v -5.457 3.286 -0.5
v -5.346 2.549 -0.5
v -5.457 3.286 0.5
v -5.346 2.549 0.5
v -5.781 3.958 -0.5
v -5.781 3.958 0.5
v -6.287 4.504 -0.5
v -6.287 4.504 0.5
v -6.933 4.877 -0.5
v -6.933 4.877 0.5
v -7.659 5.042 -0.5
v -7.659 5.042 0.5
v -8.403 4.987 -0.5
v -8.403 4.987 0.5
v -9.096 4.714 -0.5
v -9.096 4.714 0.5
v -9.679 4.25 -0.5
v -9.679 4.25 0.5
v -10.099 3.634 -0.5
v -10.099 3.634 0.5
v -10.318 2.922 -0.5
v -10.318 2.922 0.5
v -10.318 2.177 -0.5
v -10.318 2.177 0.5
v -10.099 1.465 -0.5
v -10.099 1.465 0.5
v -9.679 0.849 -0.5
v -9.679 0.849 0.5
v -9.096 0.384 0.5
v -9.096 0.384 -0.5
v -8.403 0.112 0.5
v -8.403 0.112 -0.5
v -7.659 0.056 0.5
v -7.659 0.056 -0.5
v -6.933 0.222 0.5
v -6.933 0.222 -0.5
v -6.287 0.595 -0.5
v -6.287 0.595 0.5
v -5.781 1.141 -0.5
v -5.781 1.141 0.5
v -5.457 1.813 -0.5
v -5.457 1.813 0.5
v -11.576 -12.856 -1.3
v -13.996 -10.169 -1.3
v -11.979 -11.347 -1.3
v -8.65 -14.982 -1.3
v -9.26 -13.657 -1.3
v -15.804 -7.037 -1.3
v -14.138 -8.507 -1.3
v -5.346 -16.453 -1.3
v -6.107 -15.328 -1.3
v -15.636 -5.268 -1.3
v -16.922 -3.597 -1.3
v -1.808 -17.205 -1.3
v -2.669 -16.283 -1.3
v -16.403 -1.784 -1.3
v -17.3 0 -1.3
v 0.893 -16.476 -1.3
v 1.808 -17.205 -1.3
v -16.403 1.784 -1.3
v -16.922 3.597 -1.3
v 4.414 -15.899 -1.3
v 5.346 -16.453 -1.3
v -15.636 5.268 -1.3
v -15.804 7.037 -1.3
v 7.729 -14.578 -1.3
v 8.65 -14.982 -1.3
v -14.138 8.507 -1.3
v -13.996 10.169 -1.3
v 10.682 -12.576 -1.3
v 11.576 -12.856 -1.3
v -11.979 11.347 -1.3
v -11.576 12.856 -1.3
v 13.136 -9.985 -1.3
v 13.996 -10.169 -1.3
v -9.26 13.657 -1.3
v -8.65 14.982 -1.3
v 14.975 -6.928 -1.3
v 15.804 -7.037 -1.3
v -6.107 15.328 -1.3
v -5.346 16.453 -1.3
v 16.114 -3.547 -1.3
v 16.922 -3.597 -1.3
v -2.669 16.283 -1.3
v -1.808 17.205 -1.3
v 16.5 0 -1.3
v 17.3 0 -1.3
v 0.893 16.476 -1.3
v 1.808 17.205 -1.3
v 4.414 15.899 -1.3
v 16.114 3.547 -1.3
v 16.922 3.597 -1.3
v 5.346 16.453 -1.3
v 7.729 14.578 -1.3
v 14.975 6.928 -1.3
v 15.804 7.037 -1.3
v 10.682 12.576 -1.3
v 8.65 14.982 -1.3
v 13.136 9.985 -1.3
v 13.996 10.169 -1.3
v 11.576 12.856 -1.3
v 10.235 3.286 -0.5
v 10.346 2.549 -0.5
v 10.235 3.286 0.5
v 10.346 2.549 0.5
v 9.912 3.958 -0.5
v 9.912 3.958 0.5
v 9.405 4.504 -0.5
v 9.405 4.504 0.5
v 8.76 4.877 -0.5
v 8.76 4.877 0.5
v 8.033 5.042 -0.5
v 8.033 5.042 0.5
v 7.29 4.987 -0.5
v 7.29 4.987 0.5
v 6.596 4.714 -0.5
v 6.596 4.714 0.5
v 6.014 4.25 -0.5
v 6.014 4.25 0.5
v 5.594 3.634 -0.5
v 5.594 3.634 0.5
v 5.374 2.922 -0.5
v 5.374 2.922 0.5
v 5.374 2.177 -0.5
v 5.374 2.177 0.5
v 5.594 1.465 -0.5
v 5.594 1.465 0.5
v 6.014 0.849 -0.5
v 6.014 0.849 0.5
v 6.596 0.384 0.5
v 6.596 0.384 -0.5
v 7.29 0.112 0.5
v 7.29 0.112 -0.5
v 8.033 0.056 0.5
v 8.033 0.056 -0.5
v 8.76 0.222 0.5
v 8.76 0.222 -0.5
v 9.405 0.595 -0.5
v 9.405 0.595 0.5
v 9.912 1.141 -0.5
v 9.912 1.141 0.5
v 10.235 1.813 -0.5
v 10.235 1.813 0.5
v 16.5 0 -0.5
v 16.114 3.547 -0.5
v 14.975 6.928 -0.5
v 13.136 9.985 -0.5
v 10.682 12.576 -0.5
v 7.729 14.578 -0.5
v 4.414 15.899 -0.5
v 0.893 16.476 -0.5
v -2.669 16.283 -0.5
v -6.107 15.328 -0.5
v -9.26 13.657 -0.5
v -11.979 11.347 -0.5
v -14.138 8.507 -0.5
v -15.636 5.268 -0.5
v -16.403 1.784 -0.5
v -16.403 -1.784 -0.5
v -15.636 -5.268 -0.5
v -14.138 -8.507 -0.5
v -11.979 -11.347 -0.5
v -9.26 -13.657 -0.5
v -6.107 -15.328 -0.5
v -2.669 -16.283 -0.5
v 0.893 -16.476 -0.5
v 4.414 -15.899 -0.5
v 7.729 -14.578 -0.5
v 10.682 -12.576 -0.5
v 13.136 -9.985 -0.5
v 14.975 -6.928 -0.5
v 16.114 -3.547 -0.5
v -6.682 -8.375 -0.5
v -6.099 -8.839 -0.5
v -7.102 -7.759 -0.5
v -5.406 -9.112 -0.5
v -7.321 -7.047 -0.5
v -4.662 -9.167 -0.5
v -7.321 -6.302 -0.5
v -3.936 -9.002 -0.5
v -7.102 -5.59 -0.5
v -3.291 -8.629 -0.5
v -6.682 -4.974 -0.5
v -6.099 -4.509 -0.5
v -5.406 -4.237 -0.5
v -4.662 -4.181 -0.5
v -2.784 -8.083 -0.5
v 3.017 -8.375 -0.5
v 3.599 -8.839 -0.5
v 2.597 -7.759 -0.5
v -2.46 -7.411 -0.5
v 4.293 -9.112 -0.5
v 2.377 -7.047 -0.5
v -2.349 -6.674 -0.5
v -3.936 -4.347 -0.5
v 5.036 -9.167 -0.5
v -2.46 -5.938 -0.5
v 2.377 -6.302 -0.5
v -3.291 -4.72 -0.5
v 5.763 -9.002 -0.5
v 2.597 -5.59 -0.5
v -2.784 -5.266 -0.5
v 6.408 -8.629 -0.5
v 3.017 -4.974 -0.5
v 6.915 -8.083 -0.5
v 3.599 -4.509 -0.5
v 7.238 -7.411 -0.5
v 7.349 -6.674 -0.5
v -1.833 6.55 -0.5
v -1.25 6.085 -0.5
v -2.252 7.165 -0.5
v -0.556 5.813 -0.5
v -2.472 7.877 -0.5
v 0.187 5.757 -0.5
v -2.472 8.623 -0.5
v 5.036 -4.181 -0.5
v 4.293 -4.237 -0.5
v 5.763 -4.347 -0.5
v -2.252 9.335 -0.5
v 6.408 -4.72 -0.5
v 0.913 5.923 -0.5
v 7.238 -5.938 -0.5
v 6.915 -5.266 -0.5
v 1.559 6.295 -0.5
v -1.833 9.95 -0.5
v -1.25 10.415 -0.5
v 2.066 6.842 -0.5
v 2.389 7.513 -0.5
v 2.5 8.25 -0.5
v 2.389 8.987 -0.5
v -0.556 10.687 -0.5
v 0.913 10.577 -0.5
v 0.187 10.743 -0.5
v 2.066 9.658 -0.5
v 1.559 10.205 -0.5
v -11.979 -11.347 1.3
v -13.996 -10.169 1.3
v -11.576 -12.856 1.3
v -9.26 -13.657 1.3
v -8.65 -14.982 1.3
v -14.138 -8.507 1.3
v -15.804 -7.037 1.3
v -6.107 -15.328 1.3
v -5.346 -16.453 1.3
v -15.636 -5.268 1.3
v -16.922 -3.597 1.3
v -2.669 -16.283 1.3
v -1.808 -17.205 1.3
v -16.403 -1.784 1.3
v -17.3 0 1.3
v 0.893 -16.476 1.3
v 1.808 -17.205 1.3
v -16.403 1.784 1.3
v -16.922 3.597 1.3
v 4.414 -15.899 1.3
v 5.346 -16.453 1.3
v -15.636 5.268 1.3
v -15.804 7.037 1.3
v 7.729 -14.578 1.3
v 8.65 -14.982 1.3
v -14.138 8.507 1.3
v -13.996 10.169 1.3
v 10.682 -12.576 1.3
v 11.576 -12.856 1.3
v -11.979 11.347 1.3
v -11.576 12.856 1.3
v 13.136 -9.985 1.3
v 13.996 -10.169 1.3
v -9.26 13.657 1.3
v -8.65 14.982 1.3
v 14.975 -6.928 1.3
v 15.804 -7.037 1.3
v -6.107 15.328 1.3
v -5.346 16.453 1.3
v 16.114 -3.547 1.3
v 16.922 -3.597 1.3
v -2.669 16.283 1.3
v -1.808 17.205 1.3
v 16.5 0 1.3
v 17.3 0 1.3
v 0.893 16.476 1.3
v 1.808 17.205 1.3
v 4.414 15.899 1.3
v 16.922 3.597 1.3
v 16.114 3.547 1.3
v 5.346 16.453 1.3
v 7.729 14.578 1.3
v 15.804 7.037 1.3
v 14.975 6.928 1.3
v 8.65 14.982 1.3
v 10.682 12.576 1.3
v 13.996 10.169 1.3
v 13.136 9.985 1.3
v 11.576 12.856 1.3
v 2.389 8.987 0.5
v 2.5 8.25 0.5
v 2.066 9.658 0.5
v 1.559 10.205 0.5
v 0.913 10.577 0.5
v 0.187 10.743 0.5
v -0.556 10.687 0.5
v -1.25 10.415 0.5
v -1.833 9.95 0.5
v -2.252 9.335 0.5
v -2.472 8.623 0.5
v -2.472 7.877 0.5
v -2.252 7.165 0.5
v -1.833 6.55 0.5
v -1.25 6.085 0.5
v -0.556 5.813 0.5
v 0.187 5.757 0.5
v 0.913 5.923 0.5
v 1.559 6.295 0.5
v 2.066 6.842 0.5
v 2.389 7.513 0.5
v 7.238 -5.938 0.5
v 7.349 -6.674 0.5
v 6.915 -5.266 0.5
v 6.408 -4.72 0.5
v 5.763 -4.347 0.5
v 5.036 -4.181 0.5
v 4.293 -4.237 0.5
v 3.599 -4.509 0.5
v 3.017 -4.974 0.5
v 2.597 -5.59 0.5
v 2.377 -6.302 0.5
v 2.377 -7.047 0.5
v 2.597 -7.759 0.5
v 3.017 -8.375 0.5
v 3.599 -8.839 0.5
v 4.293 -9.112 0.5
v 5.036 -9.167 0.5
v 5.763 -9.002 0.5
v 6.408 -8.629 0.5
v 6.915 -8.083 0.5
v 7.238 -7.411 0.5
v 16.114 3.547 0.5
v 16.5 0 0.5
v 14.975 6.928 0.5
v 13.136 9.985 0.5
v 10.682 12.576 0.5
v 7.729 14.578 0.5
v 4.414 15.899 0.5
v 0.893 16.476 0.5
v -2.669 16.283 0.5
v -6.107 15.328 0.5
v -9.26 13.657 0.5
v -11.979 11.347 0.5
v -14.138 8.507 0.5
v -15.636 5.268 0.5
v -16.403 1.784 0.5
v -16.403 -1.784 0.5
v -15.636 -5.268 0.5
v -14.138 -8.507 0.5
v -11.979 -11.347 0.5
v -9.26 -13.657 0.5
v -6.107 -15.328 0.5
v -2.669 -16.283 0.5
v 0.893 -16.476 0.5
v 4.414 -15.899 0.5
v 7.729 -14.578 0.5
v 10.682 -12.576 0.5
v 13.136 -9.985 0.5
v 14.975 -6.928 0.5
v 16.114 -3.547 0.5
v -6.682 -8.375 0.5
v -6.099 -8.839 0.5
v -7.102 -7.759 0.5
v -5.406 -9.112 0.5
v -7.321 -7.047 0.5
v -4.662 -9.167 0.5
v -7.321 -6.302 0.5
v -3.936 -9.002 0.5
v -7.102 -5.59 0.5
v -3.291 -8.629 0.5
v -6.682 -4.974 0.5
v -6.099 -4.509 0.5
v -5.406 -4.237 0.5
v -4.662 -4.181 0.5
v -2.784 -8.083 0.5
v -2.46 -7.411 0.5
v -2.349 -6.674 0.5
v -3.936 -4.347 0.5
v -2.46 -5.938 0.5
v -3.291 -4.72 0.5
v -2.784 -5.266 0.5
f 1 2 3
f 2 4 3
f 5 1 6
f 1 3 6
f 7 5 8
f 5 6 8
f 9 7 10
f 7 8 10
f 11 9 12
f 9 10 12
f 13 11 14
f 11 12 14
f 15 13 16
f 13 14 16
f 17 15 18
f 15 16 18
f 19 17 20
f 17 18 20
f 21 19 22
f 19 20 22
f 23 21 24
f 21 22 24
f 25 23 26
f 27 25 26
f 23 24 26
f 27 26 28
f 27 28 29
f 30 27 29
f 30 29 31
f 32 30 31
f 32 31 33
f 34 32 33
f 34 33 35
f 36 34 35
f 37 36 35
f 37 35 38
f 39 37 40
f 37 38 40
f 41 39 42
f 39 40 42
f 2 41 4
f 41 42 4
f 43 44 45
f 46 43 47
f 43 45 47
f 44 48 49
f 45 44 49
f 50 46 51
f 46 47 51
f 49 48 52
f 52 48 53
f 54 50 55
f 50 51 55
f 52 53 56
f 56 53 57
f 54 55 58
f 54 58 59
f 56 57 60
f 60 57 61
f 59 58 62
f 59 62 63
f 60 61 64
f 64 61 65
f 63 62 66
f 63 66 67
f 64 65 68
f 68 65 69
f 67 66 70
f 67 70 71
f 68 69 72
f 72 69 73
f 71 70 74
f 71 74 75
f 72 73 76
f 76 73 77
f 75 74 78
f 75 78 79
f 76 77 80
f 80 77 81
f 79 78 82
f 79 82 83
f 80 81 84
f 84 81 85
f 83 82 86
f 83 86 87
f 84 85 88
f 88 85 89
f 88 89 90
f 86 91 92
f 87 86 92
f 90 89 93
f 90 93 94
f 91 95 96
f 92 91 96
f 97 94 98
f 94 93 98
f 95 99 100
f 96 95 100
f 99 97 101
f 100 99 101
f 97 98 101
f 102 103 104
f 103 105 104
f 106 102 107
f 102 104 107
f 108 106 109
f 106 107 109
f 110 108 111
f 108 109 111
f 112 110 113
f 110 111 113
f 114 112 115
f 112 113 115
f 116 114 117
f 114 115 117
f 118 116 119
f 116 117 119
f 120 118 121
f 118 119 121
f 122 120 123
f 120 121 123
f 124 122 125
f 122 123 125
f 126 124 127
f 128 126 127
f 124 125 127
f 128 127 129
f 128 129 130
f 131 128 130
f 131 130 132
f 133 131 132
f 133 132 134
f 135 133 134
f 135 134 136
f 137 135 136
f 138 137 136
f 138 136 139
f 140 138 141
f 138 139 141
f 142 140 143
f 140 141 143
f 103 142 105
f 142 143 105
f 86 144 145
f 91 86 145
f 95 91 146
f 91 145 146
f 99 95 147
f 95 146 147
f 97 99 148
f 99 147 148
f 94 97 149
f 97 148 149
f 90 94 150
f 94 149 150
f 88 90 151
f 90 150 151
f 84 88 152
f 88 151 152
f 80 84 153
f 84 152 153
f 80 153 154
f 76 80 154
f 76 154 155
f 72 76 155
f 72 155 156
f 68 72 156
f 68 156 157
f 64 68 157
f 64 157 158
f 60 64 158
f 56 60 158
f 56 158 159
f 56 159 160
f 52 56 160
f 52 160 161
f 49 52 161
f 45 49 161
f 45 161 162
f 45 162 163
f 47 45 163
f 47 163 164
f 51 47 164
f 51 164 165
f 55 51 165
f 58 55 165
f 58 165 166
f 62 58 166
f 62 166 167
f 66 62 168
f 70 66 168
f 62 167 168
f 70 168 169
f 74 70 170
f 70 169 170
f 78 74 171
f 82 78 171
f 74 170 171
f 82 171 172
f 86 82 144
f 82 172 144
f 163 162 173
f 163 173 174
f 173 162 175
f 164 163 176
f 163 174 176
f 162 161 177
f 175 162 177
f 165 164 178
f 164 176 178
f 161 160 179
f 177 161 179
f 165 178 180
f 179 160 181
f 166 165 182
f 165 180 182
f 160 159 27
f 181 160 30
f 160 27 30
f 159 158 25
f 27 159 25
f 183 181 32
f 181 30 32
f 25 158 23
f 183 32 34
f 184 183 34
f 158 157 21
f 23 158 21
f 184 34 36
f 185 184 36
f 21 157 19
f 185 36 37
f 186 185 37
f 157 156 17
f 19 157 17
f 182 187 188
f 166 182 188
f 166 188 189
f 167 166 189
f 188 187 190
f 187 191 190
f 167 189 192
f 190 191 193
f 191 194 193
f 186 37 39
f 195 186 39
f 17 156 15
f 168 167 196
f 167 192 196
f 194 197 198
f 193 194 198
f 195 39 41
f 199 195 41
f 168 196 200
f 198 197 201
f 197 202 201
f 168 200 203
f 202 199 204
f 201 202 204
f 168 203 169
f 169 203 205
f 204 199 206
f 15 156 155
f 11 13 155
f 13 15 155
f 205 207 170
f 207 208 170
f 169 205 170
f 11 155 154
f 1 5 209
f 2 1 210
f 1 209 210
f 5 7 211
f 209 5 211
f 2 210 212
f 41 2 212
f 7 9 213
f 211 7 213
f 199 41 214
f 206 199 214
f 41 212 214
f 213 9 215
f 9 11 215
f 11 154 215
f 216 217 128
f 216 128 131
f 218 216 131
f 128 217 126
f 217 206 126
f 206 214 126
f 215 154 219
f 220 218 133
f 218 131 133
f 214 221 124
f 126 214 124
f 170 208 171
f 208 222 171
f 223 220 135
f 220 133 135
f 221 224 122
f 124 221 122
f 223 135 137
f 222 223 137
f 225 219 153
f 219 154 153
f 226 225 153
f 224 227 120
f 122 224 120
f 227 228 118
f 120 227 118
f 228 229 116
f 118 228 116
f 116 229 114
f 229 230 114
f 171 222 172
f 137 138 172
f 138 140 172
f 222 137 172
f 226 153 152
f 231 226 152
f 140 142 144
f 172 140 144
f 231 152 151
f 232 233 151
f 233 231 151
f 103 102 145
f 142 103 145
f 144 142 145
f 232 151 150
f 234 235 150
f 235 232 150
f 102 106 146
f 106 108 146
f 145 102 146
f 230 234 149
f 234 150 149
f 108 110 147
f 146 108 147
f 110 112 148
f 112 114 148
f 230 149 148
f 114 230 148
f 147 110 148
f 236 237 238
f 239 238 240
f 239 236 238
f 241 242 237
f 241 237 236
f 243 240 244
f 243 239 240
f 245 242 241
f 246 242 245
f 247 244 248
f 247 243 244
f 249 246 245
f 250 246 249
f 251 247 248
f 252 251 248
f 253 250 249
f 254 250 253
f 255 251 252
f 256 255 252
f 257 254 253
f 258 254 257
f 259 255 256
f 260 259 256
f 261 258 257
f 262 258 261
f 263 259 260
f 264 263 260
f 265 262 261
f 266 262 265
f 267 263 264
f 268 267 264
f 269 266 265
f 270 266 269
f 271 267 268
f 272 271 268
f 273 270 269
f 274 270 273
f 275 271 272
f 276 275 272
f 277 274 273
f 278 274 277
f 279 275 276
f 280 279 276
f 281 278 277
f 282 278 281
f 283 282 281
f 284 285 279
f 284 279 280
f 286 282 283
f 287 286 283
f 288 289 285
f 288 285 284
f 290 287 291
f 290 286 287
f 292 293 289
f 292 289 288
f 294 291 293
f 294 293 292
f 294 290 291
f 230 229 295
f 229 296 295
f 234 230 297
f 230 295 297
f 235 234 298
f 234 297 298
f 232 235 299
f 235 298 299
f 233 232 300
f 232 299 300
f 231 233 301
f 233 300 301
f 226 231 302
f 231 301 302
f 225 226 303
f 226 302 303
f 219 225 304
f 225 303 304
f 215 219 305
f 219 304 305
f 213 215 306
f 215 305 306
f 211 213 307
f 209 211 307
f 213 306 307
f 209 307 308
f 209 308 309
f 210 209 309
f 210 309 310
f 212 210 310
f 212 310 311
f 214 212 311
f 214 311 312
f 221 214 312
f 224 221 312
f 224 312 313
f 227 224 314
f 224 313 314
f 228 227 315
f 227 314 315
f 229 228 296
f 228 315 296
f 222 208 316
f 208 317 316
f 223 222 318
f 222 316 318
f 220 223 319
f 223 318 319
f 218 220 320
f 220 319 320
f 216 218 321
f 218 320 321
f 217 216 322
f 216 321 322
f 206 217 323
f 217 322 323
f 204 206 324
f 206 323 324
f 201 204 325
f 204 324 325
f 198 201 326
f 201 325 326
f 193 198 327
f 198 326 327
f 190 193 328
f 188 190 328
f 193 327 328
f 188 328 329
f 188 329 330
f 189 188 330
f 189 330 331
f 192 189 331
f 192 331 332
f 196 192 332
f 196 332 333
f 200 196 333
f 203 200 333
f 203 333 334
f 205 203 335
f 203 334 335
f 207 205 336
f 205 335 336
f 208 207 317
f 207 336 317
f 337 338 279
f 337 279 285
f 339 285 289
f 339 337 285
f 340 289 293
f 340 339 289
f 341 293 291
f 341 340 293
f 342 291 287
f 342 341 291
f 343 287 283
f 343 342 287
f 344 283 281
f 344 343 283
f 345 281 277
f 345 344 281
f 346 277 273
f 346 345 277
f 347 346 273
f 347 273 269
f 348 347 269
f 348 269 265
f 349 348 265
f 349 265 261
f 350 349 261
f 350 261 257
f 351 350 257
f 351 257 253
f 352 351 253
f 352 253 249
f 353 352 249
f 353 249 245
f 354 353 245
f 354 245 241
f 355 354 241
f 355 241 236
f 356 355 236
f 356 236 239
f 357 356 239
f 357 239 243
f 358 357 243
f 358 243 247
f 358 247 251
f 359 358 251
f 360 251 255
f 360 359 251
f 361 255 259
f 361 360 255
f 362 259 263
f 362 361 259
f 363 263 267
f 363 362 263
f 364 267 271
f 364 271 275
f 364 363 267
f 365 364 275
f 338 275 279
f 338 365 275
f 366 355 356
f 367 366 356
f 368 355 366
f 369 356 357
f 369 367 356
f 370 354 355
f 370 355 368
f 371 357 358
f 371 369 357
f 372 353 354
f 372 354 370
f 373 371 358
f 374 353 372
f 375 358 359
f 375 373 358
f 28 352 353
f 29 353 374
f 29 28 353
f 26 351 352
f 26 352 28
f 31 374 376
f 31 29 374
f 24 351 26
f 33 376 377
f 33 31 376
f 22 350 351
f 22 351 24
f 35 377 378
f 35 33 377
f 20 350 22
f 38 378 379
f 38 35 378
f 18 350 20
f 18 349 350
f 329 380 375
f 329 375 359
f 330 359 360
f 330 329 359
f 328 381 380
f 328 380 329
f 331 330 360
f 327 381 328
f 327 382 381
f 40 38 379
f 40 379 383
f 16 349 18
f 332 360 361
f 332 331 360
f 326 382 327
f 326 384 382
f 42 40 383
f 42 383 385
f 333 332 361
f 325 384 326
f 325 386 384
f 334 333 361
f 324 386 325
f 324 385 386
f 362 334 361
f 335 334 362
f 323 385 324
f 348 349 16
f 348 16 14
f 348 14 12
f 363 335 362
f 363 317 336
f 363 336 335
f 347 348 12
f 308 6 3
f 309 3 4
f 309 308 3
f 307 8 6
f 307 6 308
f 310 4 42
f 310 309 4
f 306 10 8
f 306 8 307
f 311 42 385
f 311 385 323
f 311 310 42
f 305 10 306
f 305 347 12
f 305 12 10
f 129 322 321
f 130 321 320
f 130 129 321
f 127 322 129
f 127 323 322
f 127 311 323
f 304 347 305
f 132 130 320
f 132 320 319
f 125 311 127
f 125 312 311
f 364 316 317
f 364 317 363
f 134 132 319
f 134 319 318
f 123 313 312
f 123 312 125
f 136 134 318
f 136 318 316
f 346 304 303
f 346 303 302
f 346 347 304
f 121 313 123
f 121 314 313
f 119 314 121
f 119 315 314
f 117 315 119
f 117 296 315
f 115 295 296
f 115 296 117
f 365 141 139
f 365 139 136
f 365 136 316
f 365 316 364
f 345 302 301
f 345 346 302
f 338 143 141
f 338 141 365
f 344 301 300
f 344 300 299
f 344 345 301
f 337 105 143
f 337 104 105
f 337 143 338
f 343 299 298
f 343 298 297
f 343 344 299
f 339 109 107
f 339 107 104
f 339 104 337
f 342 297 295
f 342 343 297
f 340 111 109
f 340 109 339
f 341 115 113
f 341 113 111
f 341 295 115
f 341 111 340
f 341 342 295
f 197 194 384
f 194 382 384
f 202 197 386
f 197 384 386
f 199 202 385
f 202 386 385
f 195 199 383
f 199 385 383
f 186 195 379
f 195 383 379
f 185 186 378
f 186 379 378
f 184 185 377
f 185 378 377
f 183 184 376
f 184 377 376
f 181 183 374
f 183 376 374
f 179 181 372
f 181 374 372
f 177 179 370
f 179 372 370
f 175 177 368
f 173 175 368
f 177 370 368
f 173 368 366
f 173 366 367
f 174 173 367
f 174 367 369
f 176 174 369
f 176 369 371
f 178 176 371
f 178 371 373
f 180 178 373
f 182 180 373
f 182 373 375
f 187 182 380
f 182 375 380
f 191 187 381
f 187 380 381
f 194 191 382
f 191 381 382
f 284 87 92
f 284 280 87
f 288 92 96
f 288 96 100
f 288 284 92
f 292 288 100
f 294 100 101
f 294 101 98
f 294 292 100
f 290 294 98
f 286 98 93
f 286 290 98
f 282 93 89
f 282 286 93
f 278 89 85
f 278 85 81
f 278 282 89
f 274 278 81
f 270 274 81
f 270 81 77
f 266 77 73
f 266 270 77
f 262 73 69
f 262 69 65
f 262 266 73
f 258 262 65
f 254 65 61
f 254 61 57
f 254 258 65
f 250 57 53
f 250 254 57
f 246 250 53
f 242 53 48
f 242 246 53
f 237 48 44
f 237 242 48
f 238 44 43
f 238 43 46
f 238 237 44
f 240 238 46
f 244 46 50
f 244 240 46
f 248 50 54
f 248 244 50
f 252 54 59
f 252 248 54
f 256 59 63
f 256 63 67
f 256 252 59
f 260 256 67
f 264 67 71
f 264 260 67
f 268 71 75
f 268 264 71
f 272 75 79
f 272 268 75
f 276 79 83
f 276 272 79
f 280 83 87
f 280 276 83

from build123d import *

# Parameters (mm, degrees)
F0_R          = 17.3
F0_R_2        = 16.5
F1_DEPTH      = 1.3
F1_DEPTH_BACK = 1.3
F2_R          = 17.25
F3_DEPTH      = 0.5
F3_DEPTH_BACK = 0.5
F4_R          = 2.5
F5_DEPTH      = 1
F5_DEPTH_BACK = 1


with BuildPart() as f1:
    # F0 (on Top) → F1 (new body, two sides)
    with BuildSketch(Plane.XY) as f1_sk:
        Circle(F0_R)
        Circle(F0_R_2, mode=Mode.SUBTRACT)
    extrude(amount=F1_DEPTH)
    extrude(f1_sk.sketch, amount=-F1_DEPTH_BACK)

    # F2 (on Top) → F3 (join, two sides)
    with BuildSketch(Plane.XY) as f3_sk:
        Circle(F2_R)
    extrude(amount=F3_DEPTH)
    extrude(f3_sk.sketch, amount=-F3_DEPTH_BACK)

    # F4 (on Top) → F5 (cut, two sides)
    with BuildSketch(Plane.XY) as f5_sk:
        with Locations((0, 8.25)):
            Circle(F4_R)
        with Locations((-7.8462162594, 2.5493902036)):
            Circle(F4_R)
        with Locations((-4.8492283314, -6.6743902036)):
            Circle(F4_R)
        with Locations((4.8492283314, -6.6743902036)):
            Circle(F4_R)
        with Locations((7.8462162594, 2.5493902036)):
            Circle(F4_R)
    extrude(amount=-F5_DEPTH, mode=Mode.SUBTRACT)
    extrude(f5_sk.sketch, amount=F5_DEPTH_BACK, mode=Mode.SUBTRACT)


solid = f1.part
